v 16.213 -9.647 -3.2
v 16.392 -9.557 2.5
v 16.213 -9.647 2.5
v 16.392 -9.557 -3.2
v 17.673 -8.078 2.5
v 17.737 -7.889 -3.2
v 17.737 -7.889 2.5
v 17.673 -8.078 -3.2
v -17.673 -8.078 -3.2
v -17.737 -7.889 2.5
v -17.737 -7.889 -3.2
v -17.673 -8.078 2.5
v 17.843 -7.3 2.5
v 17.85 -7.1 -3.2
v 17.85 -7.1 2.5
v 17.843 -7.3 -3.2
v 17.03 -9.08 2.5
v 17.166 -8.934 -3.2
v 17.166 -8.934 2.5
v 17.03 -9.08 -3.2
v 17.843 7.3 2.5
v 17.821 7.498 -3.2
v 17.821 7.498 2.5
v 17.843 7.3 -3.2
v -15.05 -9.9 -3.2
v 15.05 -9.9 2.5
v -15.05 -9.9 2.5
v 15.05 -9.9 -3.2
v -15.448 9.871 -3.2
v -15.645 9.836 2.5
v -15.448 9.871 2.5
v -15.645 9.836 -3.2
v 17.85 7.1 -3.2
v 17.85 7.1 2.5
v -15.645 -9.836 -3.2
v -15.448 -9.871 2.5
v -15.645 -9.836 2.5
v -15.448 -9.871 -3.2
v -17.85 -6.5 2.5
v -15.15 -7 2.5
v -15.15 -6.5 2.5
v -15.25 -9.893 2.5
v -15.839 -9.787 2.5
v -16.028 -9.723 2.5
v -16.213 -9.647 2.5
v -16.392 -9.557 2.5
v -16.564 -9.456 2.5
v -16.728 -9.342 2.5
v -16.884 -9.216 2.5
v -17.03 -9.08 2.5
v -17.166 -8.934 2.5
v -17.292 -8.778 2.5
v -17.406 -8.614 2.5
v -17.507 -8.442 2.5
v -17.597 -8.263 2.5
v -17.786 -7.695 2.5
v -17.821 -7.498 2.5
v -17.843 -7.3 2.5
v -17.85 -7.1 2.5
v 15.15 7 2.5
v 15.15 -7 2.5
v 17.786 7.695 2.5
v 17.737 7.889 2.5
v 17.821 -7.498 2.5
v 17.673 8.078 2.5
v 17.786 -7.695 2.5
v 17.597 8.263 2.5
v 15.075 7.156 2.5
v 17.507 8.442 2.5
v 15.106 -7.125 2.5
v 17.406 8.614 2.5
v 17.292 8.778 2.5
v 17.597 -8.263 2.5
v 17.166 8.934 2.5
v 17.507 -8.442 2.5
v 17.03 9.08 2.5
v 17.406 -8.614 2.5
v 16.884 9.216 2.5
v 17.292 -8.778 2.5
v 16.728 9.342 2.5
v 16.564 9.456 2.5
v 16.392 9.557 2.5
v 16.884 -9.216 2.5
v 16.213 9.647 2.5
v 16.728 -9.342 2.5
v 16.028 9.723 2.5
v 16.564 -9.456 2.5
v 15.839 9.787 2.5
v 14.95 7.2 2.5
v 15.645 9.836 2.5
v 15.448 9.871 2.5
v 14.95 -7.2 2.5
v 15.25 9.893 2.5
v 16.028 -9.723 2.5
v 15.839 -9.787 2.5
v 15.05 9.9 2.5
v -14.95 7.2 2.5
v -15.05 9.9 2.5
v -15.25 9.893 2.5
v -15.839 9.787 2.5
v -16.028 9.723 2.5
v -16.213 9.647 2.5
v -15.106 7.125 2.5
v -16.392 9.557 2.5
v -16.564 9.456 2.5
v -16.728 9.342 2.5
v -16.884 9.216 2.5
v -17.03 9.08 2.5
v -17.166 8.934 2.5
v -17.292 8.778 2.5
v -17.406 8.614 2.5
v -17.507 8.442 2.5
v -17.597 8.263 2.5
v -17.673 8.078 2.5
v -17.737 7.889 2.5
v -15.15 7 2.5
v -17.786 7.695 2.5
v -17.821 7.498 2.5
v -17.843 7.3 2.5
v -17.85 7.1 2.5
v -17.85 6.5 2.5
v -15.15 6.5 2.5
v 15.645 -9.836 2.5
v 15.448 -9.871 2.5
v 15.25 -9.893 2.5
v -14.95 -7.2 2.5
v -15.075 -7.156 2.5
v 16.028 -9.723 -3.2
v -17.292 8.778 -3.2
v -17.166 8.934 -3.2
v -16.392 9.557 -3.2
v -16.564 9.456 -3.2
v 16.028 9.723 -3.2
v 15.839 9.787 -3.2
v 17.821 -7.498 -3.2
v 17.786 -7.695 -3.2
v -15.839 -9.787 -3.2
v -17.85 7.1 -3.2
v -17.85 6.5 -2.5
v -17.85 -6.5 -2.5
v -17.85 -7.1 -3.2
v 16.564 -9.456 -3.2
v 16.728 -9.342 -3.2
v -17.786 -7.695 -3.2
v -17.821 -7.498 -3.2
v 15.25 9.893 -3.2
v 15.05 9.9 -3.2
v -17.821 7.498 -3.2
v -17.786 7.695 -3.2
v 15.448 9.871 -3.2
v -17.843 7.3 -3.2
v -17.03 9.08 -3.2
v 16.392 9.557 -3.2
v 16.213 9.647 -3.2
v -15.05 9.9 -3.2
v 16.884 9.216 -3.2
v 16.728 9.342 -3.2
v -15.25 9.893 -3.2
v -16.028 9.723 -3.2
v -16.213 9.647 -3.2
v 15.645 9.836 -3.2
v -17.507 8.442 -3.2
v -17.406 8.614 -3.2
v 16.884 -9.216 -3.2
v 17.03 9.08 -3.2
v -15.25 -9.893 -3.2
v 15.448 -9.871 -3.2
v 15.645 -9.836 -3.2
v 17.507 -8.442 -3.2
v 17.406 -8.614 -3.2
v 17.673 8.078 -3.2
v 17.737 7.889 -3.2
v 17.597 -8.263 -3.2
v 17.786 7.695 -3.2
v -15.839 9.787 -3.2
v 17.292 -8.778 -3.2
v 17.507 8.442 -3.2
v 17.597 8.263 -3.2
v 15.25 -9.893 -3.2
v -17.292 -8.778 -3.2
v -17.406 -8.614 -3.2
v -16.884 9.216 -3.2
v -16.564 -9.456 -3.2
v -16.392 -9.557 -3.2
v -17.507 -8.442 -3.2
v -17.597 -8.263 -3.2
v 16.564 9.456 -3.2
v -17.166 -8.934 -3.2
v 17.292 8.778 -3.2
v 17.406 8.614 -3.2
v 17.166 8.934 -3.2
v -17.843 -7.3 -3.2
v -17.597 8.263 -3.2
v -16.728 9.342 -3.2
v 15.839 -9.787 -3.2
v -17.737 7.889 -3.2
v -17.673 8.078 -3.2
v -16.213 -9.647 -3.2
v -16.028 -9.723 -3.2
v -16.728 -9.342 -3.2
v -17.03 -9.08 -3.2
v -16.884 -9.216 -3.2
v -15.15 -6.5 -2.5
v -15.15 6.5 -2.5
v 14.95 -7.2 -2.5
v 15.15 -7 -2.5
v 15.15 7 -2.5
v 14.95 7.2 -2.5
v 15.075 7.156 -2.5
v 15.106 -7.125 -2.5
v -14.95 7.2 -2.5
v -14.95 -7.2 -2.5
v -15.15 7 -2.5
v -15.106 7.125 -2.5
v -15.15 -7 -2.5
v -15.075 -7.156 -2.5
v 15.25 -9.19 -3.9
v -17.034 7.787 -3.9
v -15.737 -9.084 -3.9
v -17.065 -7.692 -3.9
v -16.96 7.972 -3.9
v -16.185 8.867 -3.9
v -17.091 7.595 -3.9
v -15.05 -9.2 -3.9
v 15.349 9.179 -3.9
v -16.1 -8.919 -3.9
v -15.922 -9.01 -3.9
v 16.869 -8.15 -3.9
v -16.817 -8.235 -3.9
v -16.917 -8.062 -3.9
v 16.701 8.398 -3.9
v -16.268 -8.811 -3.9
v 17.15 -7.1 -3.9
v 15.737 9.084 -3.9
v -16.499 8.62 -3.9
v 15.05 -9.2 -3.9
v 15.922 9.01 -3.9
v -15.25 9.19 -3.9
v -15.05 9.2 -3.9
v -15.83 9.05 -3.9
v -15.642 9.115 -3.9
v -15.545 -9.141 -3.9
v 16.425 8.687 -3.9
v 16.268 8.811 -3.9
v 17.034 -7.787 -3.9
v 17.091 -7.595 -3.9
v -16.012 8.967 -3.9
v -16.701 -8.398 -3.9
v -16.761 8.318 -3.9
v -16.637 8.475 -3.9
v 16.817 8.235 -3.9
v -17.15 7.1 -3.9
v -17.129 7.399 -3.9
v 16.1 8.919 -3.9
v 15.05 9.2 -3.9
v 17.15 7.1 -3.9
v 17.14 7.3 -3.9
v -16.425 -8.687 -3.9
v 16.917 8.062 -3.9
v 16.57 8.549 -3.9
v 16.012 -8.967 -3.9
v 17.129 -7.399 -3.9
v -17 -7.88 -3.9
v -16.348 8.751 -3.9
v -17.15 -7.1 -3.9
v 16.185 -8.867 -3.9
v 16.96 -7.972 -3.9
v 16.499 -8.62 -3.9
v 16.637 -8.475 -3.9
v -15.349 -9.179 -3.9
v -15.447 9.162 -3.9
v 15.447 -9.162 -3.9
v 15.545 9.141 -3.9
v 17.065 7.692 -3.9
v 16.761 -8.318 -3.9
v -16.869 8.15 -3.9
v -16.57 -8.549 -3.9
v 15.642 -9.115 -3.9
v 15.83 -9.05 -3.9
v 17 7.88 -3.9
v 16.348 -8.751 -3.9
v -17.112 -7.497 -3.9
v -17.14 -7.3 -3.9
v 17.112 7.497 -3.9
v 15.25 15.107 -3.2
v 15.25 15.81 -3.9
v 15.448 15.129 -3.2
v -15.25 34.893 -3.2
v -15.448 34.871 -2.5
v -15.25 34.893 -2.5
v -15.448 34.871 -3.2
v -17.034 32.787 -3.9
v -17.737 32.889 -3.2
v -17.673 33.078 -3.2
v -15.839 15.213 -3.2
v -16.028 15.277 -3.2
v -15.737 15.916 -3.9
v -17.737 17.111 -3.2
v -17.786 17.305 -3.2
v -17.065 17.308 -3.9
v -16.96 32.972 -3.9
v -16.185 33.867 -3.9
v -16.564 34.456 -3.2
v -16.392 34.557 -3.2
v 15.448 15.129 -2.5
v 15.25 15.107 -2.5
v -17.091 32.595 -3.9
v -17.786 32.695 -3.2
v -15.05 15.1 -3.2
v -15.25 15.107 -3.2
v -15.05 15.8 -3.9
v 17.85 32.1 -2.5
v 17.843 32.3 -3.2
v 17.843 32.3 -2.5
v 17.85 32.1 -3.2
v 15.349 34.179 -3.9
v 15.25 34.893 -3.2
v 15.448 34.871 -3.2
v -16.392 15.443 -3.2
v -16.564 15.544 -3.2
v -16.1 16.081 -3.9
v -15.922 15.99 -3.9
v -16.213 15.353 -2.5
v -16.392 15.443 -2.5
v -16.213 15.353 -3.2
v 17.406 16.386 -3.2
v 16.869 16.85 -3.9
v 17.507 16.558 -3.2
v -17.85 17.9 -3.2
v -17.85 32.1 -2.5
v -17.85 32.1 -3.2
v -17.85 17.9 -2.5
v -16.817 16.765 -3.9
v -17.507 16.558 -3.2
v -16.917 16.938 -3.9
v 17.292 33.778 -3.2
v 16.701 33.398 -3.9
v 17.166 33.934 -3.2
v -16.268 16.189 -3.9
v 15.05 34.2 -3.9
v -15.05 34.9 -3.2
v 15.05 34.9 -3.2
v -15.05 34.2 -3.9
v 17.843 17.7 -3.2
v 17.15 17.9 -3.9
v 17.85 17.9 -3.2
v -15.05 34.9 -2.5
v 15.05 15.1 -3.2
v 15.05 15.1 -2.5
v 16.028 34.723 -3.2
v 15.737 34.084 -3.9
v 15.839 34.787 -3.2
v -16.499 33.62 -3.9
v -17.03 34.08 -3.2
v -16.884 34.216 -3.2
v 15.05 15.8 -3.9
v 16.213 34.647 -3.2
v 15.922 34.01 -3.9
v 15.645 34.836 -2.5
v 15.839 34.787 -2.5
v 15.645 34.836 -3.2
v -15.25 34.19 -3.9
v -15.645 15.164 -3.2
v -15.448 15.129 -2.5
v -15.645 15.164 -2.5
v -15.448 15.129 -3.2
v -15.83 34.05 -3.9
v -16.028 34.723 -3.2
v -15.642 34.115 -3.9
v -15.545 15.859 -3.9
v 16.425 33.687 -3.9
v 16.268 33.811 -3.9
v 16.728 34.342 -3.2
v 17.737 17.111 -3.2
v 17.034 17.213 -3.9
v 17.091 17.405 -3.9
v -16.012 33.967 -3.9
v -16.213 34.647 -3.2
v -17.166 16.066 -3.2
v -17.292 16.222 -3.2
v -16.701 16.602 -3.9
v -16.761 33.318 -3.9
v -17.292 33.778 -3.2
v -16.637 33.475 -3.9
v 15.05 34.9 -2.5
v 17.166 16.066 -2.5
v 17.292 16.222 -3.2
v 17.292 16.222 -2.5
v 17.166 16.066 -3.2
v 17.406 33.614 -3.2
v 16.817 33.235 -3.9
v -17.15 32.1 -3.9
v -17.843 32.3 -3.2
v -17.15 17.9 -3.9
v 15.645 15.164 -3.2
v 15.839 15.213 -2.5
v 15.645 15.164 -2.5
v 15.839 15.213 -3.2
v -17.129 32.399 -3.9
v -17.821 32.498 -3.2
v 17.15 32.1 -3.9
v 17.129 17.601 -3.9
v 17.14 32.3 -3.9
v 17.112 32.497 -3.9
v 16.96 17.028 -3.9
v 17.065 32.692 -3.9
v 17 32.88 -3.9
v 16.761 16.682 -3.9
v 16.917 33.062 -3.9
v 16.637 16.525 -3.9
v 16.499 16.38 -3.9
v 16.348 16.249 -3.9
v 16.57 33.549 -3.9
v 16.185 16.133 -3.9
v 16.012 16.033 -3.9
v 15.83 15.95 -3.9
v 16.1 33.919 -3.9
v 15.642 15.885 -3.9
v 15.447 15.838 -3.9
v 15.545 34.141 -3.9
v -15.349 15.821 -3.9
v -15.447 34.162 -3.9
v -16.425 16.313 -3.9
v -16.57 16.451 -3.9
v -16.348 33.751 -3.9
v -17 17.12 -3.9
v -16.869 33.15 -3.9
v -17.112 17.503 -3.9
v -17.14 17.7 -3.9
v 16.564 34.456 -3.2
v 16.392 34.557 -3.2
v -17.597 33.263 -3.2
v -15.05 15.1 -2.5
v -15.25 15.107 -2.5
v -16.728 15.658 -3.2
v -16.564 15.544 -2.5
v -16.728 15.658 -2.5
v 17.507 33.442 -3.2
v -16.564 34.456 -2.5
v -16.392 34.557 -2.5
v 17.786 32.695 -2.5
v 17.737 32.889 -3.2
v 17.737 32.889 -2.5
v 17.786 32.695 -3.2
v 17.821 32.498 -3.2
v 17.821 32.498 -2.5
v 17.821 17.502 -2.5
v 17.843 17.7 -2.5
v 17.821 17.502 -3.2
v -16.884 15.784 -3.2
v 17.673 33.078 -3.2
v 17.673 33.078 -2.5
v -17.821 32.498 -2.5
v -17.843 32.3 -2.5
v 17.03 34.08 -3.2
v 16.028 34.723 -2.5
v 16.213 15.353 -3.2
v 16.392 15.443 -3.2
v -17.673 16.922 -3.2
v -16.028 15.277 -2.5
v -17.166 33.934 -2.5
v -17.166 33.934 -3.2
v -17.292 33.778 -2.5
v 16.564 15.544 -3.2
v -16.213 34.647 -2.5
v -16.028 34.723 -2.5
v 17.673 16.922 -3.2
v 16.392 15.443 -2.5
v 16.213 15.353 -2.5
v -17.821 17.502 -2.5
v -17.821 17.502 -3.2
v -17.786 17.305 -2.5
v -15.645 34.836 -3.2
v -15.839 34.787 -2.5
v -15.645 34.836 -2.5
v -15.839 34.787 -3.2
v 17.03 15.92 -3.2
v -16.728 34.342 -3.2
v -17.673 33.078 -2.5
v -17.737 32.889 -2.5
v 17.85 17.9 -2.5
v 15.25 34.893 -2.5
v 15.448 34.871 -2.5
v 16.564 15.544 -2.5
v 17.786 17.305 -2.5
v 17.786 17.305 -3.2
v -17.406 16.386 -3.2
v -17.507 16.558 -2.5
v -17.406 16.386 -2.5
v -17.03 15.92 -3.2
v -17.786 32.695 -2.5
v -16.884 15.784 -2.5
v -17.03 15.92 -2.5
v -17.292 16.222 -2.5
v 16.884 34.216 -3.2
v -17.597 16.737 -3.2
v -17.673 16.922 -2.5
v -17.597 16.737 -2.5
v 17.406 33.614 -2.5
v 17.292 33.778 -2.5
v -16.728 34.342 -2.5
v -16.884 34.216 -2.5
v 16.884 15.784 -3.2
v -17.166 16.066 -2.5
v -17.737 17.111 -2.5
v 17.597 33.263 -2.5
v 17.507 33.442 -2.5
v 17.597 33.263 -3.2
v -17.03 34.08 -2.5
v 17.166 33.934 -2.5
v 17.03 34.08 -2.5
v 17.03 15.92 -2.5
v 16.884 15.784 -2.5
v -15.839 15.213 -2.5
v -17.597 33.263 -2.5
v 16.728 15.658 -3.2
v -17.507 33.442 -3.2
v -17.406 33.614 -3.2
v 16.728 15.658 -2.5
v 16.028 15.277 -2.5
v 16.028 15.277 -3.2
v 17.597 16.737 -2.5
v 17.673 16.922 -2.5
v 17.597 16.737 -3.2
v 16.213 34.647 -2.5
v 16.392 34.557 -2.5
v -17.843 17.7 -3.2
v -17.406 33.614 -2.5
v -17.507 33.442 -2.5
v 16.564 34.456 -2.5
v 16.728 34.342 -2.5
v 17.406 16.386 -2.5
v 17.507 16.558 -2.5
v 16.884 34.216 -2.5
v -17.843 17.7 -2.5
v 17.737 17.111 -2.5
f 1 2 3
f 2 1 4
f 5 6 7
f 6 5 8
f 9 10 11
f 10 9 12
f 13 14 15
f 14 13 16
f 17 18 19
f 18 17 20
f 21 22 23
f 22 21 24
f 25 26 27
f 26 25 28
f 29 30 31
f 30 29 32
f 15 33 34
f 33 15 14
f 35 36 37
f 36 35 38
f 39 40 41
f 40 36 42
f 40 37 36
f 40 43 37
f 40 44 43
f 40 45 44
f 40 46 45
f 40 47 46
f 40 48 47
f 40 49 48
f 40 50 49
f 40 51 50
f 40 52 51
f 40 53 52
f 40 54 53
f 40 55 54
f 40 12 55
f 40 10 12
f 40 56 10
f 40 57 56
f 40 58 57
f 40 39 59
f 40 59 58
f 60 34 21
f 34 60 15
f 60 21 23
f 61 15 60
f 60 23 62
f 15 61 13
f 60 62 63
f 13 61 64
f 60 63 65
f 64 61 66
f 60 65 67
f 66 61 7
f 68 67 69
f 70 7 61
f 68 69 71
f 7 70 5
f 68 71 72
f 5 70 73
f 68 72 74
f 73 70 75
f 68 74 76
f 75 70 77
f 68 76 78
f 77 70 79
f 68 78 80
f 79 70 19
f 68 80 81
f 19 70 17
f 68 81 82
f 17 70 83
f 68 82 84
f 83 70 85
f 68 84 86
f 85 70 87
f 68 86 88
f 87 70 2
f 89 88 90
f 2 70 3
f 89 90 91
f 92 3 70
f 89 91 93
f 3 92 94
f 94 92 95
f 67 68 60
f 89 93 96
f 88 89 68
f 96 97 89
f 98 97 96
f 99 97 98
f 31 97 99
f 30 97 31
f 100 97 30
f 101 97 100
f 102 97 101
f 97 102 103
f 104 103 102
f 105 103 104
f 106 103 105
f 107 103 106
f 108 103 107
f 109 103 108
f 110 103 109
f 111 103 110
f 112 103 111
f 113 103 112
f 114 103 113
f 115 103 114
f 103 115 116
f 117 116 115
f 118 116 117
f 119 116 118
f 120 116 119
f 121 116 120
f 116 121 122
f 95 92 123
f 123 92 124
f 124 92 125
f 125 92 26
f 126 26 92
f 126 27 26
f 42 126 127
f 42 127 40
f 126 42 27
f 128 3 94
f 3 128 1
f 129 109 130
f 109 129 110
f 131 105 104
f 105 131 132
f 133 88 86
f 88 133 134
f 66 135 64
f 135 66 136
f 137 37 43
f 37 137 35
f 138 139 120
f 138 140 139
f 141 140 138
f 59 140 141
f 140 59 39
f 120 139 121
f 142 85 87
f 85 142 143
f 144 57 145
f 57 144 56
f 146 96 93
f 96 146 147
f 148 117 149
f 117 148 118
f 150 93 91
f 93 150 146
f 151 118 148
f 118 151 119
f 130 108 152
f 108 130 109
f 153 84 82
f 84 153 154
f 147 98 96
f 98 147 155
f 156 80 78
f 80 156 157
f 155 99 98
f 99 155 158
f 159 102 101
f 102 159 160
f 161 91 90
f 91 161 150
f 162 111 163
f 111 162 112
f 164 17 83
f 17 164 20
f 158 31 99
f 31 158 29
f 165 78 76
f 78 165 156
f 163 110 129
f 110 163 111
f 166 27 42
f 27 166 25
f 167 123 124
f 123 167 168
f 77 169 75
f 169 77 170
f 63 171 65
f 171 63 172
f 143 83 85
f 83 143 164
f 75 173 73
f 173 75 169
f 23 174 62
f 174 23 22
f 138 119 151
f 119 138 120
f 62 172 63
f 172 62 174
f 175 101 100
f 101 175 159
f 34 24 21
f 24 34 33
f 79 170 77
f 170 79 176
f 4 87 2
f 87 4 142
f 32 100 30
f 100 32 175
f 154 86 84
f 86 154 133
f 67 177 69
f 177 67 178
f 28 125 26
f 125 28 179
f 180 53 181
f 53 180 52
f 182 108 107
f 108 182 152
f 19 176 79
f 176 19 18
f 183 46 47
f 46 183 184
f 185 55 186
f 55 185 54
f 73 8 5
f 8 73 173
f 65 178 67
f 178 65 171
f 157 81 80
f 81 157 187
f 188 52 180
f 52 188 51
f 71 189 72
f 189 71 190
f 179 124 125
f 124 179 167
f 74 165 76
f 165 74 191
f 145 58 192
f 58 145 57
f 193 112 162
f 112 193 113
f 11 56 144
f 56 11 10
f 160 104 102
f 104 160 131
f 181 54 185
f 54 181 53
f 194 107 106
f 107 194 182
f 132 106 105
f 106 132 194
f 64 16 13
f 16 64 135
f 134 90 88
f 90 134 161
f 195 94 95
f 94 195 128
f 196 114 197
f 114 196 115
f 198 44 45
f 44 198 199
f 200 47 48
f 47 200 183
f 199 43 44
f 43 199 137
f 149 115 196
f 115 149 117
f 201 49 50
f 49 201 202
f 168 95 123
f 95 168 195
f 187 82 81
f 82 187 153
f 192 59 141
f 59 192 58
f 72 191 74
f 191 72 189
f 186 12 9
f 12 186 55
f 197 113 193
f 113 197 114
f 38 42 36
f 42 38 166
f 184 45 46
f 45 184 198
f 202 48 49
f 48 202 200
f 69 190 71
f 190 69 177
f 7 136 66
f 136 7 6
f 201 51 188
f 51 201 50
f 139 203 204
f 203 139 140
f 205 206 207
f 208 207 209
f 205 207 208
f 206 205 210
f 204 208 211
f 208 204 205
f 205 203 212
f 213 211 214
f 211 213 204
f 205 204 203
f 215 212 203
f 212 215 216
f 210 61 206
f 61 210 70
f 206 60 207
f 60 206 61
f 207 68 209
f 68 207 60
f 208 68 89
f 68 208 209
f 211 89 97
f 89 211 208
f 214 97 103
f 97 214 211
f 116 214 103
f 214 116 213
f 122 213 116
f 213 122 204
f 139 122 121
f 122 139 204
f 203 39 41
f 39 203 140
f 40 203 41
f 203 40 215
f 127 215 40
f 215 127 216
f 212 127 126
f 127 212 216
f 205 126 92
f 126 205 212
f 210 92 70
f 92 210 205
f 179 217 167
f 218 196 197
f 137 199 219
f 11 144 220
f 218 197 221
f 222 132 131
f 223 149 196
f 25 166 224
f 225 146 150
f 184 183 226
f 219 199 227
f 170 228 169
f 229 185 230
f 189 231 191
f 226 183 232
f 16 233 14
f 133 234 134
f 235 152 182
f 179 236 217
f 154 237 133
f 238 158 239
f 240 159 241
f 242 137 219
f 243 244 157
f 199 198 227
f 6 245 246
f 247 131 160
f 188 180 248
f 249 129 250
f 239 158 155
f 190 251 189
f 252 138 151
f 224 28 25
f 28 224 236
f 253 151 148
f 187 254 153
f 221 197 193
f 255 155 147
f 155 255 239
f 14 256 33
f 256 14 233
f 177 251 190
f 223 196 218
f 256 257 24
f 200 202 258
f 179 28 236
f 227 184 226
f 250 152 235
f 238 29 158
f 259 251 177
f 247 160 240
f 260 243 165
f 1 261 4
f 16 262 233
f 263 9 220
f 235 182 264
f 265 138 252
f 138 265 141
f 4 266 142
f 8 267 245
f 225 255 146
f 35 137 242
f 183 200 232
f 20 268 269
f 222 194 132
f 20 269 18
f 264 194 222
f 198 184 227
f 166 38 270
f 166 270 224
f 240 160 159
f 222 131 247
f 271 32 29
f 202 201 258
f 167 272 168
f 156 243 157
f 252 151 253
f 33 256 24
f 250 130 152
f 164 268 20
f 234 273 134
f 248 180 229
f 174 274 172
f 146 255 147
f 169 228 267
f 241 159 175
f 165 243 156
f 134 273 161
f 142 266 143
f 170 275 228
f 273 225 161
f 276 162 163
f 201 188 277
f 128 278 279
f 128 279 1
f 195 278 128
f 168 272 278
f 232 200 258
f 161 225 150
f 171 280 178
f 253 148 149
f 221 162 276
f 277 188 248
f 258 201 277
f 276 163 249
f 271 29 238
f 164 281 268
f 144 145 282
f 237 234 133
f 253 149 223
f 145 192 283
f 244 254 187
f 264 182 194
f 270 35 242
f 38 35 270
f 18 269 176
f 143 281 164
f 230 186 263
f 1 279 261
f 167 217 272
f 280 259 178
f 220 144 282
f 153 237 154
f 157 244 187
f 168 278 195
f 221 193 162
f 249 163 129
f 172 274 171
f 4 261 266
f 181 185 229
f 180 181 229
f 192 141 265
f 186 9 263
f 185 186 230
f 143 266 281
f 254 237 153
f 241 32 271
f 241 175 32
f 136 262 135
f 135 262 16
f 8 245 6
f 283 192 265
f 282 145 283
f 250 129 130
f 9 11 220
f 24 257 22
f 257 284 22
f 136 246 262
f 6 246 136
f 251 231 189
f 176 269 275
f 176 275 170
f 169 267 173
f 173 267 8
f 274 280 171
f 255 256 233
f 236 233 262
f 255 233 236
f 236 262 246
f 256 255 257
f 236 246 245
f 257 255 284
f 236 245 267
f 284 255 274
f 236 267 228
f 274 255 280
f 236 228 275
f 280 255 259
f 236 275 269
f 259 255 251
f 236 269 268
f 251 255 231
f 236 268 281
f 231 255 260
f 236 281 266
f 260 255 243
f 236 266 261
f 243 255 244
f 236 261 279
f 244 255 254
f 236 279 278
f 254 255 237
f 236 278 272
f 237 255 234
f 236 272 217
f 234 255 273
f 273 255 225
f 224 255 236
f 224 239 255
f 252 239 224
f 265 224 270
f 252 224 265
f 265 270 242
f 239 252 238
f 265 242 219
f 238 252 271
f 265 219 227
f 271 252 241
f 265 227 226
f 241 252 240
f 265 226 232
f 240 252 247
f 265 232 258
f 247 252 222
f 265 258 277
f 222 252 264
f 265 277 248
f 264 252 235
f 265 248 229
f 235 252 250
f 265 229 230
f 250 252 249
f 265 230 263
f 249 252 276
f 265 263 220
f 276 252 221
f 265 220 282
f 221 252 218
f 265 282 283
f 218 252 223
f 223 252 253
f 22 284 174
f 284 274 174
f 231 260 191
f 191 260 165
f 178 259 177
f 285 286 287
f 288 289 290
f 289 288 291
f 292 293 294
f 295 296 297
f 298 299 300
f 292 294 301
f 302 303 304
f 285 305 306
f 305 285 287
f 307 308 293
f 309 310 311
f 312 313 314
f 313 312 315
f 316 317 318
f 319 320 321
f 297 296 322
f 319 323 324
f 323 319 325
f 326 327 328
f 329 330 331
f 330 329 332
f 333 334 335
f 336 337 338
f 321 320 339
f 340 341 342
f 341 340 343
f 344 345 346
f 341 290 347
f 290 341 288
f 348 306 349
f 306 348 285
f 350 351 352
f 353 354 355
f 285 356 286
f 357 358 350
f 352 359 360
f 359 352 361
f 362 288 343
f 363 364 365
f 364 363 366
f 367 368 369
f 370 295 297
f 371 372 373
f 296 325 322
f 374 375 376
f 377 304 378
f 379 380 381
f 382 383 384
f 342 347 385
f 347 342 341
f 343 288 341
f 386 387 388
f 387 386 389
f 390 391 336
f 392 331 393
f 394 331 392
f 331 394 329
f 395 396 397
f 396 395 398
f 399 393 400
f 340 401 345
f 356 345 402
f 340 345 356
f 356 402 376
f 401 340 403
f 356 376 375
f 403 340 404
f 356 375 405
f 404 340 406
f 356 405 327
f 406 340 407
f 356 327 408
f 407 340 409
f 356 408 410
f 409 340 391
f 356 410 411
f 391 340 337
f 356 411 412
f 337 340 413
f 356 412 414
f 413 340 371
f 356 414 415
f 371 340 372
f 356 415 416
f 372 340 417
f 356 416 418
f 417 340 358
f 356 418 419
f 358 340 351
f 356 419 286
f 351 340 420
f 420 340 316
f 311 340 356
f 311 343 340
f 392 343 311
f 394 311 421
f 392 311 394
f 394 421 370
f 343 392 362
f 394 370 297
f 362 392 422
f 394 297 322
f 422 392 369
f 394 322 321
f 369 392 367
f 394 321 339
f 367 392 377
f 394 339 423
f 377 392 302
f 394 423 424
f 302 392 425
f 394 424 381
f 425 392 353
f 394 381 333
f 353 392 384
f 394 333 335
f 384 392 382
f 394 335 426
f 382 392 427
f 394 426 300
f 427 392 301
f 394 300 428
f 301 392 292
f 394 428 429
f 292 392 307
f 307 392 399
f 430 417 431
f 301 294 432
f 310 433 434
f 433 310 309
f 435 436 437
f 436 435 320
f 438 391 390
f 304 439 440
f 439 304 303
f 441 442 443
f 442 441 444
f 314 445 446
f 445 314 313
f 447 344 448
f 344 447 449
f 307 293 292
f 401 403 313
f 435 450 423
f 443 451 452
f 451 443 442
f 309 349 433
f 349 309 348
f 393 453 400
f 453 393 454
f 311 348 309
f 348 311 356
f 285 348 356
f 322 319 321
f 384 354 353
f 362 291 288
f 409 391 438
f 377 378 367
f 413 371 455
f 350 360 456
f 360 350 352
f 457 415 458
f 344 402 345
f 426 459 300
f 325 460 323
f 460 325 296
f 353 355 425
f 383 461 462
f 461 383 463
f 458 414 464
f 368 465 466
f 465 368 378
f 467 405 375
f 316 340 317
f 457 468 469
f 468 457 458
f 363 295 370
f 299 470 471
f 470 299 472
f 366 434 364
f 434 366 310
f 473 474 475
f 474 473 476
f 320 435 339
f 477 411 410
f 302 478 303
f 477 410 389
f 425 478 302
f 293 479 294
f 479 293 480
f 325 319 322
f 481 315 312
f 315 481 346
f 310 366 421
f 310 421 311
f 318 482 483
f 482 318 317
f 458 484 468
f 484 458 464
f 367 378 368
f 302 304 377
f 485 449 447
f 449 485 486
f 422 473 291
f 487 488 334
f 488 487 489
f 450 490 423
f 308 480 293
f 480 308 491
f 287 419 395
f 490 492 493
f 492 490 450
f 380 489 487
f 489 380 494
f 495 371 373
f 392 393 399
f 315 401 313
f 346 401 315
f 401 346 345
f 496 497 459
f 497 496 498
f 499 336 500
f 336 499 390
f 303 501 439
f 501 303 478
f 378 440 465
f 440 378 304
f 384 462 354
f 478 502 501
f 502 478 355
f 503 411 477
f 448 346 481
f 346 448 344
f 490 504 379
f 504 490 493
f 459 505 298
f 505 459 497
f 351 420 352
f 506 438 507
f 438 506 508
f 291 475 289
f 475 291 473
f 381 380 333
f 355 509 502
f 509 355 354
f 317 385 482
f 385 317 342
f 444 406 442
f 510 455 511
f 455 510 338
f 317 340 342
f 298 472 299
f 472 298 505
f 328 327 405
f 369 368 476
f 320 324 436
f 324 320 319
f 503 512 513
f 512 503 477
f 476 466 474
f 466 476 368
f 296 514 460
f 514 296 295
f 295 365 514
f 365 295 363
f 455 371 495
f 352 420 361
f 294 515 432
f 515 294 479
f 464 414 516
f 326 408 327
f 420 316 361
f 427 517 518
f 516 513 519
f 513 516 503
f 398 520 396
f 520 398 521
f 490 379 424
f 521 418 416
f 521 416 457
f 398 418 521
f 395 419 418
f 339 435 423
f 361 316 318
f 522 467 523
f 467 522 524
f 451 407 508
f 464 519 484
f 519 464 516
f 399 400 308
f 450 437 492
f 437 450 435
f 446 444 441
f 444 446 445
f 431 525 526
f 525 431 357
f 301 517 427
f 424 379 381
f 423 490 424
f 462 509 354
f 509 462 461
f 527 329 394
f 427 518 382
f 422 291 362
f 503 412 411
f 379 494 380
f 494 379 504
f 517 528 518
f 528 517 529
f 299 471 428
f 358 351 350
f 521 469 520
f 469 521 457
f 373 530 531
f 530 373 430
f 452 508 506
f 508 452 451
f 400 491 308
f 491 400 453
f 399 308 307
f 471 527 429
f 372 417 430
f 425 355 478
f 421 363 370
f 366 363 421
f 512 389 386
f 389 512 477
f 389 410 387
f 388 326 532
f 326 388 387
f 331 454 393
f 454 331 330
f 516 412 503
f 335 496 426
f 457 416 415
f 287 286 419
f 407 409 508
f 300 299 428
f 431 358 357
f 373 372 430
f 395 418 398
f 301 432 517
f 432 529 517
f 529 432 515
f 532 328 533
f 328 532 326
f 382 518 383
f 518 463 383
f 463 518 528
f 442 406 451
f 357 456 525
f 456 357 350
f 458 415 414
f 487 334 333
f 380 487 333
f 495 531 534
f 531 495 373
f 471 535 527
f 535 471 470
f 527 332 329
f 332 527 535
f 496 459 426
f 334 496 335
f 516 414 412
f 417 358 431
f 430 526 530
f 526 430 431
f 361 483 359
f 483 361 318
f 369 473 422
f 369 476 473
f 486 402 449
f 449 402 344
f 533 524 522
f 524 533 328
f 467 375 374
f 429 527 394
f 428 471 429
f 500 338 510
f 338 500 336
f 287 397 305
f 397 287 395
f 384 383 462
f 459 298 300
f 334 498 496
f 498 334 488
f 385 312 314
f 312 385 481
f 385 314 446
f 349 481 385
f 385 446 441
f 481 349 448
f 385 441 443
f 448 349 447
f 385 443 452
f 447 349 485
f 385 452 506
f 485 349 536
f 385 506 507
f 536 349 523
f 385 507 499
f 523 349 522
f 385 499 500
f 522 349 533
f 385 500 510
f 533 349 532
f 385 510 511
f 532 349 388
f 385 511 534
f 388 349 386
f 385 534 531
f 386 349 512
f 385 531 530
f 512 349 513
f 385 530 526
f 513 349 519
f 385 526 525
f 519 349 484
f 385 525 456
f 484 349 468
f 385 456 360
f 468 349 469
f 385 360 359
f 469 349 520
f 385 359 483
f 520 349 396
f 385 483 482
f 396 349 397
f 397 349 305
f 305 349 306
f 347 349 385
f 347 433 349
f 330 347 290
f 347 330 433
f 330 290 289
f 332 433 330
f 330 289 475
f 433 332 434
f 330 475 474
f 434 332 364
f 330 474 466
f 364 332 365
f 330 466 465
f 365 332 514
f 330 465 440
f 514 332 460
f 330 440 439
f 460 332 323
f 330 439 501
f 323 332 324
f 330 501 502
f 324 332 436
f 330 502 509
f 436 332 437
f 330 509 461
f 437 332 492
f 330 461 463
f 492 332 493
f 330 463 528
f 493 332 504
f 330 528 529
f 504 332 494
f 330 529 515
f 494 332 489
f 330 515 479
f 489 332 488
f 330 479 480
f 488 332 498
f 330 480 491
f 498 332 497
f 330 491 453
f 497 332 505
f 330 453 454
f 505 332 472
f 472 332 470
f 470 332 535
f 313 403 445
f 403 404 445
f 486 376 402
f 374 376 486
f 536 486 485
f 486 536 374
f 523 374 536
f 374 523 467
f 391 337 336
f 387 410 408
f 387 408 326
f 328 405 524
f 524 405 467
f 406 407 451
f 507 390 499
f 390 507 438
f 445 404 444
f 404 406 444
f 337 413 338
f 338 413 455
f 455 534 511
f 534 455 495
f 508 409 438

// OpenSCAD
/*
thumbdrive_housing.scad generates USB/thumb drive housing

GNU General Public License v3.0
Permissions of this strong copyleft license are conditioned on making available complete source
code of licensed works and modifications, which include larger works using a licensed work, under
the same license. Copyright and license notices must be preserved. Contributors provide an express
grant of patent rights.
*/

label="";
label_font="Liberation Sans:style=Bold";

key_bow = "N"; //[N:None, T:Tiny, S:Small, M:Medium, L:Large]
interlocking = false; //[true, false]

usb_covered_length = 2.8;
usb_length = 14.8;
usb_width = 12.6;
usb_height = 4.6;

pcb_length = 29.9;
pcb_width = 14.0;

printer_tolerance = 0.2;
nozzle_width = 0.4;
layer_height = 0.2;

/* [Hidden] */
// Resolution
$fa=2; // default minimum facet angle
$fs=0.2; // default minimum facet size

// oversize for preview rendering of negative shapes
oversize = 0.1;

module thumbdrive_housing( l = label,
                           kb = key_bow,
                           il = interlocking,
                           uw = usb_width,
                           ul = usb_length,
                           uh = usb_height,
                           pw = pcb_width,
                           pl = pcb_length,
                           ucl = usb_covered_length,
                           tol = printer_tolerance,
                           nw = nozzle_width,
                           lh = layer_height ) {

  function key_bow_hole_size()
    = ((kb == "S") || (kb == "Small")) ? pw/3
    : ((kb == "M") || (kb == "Medium")) ? pw/2
    : ((kb == "L") || (kb == "Large")) ? 3*pw/4
    : 0; // Default value 0 for N, None or anything else
  
  function chamfer() = ucl/4;
  
  module add_key_bow(chamfer = 0) {
    if ((kb != "N") && (kb != "None")) {
      translate([pl/2+tol+(key_bow_hole_size()+ucl), 0, 0]) {
        circle(r=key_bow_hole_size()+ucl-chamfer);
      }
    }
  }
  
  module substract_key_bow_hole() {
    if ((kb != "N") && (kb != "None")) {
      linear_extrude(height = uh+2*tol+ucl+oversize, center = true, convexity = 10, twist = 0) {
        translate([pl/2+tol+(key_bow_hole_size()+ucl), 0, 0]) {
          circle(r=key_bow_hole_size());
        }
      }
    }
  }

  module usb_area() {
    translate([-(pl+ul)/2, 0, 0]) {
      square(size = [ul, uw], center = true);
    }
  }
  
  module pcb_area() {
    square(size = [pl, pw], center = true);
  }
  
  module extrude(size_h) {
    linear_extrude(height = size_h, center = true, convexity = 10, twist = 0) {
      children();
    }
  }

  module thumbdrive_shape(size_h, size_o, size_x, size_y, size_r) {
    extrude(size_h) {
      offset(r = size_o) {
        square(size = [size_x, size_y], center = true);
      }
      add_key_bow(size_r);
    }
  }

  module housing_cover() {
    translate([0, 0, -uh/2-chamfer()-tol]) {
      hull() {
        translate([0, 0, chamfer()/2]) {
          thumbdrive_shape(chamfer(), ucl, pl+tol, pw+tol, 0);
        }
        translate([0, 0, -chamfer()/2]) {
          thumbdrive_shape(chamfer(), ucl-chamfer(), pl+tol, pw+tol, chamfer());
        }
      }
    }
  }

  module label(l) {
    mirror([1, 0, 0]) {
      translate([0, 0, -5*chamfer()-tol/4-oversize/2]) {
        extrude(chamfer()) {
          resize([0.8*pl, 0.6*pw, 0], auto=true) {
            text(l, valign = "center", halign = "center", font = label_font);
          }
        }
      }
    }
  }
  
  module frame() {
    difference() {
      hull() thumbdrive_shape(uh+2*tol, ucl, pl+tol, pw+tol, 0);
      extrude(uh+2*tol+oversize) {
        offset(r = tol) pcb_area();
        offset(r = tol) usb_area();
      }
    }
  }
  
  module print_settings() {
    perimeters = floor(ucl/nw/2);
    echo("SUGGESTED FDM PRINTER SETTINGS:");
    echo(nozzel_width=nw, layer_height=lh, number_of_perimeters=perimeters);
  }
  
  // Main
  module thumdrive() {
    // Distance between cover and PCB holder
    dist = 5;
    // Housing
    difference() {
      union() {
        frame();
        housing_cover();
      }
      label(l);
      substract_key_bow_hole();
    }
    
    // Housing cover
    translate([0, (pw > 2*key_bow_hole_size()) ? pw+2*(ucl+tol) + dist : 2*key_bow_hole_size()+2*(ucl+tol) + dist, 0]) {
      union() {
        difference() {
          housing_cover();
          substract_key_bow_hole();
        }
        if (il) {
          translate([0, 0, -uh/2]) {
            extrude(2*lh) difference() {
              pcb_area();
              offset(r = -2*nw) pcb_area();
            }
          }
        }
      }
    }
    
    // Nude USB drive
    if ($preview) {
      color("Green", 0.5) {
        extrude(uh) {
          pcb_area();
          usb_area();
        }
      }
    }
    
    // Print suggested printer settings */
    print_settings();
  }
  thumdrive();
};

// Customizer instantiation
thumbdrive_housing();
